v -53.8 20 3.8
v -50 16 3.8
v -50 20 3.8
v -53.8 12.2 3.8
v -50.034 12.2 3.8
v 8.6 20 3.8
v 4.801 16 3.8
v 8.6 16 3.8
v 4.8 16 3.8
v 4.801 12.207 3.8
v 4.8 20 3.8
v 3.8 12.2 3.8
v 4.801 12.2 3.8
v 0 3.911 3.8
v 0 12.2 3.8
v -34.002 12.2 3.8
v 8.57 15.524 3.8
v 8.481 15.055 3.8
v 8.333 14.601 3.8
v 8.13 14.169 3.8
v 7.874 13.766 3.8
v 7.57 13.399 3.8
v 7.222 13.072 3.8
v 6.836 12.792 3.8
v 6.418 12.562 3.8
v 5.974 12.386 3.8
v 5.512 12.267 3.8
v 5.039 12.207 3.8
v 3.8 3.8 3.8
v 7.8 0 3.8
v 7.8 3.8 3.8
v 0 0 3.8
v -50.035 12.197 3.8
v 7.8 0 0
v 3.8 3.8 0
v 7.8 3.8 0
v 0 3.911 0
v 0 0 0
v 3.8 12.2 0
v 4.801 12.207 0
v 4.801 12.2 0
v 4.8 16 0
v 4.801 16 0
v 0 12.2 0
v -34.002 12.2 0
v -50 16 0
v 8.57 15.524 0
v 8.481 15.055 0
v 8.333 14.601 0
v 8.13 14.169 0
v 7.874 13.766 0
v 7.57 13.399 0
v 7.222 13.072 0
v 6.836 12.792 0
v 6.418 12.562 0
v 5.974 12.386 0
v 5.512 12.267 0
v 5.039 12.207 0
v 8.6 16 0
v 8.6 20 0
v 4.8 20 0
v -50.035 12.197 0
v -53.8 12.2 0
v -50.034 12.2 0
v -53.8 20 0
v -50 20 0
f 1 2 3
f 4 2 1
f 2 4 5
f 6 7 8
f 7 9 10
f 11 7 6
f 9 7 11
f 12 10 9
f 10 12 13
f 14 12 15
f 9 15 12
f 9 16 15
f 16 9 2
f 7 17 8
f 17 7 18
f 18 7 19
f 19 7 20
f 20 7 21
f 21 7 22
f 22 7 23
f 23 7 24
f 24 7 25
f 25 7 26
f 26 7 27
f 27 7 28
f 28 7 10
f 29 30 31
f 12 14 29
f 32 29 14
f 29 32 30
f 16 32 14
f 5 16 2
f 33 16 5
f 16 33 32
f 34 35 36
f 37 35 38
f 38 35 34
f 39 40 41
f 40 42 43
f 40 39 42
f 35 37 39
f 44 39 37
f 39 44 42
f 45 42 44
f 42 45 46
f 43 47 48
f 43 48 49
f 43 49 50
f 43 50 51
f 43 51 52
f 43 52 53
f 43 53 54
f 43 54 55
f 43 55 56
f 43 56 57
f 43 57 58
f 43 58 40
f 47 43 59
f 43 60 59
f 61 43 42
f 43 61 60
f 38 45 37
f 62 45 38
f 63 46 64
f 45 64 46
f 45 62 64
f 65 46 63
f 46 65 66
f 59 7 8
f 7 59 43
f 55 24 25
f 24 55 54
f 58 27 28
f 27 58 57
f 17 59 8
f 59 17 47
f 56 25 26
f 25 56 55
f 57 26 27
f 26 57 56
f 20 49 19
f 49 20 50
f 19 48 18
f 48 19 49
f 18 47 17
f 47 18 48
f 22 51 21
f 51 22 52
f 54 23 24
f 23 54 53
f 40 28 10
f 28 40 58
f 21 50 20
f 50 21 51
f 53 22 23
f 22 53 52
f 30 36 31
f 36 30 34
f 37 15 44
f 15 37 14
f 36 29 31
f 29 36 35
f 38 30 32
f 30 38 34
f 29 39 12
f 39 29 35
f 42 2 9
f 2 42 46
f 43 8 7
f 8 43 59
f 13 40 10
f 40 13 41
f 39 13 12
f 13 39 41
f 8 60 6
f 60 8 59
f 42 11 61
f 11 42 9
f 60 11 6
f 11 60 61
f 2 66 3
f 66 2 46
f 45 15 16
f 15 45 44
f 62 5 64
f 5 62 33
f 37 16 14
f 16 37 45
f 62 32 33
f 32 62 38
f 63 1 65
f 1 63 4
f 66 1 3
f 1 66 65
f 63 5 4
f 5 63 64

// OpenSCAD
// file: pegboard-modules.scad
module hanger(height, width, pin_height) {
    cube([width+pin_height, width, width]);
    cube([width, height, width]);
    translate([0, height-width, 0]) cube([width + 1 + 0.001, width, width]);
    translate([width+1, height, 0]) cube([width, pin_height, width]);
    translate([width+1, height-width, 0]) intersection() {
        cube([width, width, width]);
        translate([0, width, 0]) cylinder(r=width, $fn=50, h=width);
    }
}
// main file
use <pegboard-modules.scad>;

short_height = 16;
width = 3.8;
pin_height = 4;

hanger(short_height, width, pin_height);

translate([-50, short_height-width, 0]) cube([50, width, width]);
rotate([0, 0, -13.7]) translate([-51.5, 0, 0]) cube([51.5, width, width]);
translate([-50-width, short_height-width, 0]) cube([width, width + pin_height, width]);
